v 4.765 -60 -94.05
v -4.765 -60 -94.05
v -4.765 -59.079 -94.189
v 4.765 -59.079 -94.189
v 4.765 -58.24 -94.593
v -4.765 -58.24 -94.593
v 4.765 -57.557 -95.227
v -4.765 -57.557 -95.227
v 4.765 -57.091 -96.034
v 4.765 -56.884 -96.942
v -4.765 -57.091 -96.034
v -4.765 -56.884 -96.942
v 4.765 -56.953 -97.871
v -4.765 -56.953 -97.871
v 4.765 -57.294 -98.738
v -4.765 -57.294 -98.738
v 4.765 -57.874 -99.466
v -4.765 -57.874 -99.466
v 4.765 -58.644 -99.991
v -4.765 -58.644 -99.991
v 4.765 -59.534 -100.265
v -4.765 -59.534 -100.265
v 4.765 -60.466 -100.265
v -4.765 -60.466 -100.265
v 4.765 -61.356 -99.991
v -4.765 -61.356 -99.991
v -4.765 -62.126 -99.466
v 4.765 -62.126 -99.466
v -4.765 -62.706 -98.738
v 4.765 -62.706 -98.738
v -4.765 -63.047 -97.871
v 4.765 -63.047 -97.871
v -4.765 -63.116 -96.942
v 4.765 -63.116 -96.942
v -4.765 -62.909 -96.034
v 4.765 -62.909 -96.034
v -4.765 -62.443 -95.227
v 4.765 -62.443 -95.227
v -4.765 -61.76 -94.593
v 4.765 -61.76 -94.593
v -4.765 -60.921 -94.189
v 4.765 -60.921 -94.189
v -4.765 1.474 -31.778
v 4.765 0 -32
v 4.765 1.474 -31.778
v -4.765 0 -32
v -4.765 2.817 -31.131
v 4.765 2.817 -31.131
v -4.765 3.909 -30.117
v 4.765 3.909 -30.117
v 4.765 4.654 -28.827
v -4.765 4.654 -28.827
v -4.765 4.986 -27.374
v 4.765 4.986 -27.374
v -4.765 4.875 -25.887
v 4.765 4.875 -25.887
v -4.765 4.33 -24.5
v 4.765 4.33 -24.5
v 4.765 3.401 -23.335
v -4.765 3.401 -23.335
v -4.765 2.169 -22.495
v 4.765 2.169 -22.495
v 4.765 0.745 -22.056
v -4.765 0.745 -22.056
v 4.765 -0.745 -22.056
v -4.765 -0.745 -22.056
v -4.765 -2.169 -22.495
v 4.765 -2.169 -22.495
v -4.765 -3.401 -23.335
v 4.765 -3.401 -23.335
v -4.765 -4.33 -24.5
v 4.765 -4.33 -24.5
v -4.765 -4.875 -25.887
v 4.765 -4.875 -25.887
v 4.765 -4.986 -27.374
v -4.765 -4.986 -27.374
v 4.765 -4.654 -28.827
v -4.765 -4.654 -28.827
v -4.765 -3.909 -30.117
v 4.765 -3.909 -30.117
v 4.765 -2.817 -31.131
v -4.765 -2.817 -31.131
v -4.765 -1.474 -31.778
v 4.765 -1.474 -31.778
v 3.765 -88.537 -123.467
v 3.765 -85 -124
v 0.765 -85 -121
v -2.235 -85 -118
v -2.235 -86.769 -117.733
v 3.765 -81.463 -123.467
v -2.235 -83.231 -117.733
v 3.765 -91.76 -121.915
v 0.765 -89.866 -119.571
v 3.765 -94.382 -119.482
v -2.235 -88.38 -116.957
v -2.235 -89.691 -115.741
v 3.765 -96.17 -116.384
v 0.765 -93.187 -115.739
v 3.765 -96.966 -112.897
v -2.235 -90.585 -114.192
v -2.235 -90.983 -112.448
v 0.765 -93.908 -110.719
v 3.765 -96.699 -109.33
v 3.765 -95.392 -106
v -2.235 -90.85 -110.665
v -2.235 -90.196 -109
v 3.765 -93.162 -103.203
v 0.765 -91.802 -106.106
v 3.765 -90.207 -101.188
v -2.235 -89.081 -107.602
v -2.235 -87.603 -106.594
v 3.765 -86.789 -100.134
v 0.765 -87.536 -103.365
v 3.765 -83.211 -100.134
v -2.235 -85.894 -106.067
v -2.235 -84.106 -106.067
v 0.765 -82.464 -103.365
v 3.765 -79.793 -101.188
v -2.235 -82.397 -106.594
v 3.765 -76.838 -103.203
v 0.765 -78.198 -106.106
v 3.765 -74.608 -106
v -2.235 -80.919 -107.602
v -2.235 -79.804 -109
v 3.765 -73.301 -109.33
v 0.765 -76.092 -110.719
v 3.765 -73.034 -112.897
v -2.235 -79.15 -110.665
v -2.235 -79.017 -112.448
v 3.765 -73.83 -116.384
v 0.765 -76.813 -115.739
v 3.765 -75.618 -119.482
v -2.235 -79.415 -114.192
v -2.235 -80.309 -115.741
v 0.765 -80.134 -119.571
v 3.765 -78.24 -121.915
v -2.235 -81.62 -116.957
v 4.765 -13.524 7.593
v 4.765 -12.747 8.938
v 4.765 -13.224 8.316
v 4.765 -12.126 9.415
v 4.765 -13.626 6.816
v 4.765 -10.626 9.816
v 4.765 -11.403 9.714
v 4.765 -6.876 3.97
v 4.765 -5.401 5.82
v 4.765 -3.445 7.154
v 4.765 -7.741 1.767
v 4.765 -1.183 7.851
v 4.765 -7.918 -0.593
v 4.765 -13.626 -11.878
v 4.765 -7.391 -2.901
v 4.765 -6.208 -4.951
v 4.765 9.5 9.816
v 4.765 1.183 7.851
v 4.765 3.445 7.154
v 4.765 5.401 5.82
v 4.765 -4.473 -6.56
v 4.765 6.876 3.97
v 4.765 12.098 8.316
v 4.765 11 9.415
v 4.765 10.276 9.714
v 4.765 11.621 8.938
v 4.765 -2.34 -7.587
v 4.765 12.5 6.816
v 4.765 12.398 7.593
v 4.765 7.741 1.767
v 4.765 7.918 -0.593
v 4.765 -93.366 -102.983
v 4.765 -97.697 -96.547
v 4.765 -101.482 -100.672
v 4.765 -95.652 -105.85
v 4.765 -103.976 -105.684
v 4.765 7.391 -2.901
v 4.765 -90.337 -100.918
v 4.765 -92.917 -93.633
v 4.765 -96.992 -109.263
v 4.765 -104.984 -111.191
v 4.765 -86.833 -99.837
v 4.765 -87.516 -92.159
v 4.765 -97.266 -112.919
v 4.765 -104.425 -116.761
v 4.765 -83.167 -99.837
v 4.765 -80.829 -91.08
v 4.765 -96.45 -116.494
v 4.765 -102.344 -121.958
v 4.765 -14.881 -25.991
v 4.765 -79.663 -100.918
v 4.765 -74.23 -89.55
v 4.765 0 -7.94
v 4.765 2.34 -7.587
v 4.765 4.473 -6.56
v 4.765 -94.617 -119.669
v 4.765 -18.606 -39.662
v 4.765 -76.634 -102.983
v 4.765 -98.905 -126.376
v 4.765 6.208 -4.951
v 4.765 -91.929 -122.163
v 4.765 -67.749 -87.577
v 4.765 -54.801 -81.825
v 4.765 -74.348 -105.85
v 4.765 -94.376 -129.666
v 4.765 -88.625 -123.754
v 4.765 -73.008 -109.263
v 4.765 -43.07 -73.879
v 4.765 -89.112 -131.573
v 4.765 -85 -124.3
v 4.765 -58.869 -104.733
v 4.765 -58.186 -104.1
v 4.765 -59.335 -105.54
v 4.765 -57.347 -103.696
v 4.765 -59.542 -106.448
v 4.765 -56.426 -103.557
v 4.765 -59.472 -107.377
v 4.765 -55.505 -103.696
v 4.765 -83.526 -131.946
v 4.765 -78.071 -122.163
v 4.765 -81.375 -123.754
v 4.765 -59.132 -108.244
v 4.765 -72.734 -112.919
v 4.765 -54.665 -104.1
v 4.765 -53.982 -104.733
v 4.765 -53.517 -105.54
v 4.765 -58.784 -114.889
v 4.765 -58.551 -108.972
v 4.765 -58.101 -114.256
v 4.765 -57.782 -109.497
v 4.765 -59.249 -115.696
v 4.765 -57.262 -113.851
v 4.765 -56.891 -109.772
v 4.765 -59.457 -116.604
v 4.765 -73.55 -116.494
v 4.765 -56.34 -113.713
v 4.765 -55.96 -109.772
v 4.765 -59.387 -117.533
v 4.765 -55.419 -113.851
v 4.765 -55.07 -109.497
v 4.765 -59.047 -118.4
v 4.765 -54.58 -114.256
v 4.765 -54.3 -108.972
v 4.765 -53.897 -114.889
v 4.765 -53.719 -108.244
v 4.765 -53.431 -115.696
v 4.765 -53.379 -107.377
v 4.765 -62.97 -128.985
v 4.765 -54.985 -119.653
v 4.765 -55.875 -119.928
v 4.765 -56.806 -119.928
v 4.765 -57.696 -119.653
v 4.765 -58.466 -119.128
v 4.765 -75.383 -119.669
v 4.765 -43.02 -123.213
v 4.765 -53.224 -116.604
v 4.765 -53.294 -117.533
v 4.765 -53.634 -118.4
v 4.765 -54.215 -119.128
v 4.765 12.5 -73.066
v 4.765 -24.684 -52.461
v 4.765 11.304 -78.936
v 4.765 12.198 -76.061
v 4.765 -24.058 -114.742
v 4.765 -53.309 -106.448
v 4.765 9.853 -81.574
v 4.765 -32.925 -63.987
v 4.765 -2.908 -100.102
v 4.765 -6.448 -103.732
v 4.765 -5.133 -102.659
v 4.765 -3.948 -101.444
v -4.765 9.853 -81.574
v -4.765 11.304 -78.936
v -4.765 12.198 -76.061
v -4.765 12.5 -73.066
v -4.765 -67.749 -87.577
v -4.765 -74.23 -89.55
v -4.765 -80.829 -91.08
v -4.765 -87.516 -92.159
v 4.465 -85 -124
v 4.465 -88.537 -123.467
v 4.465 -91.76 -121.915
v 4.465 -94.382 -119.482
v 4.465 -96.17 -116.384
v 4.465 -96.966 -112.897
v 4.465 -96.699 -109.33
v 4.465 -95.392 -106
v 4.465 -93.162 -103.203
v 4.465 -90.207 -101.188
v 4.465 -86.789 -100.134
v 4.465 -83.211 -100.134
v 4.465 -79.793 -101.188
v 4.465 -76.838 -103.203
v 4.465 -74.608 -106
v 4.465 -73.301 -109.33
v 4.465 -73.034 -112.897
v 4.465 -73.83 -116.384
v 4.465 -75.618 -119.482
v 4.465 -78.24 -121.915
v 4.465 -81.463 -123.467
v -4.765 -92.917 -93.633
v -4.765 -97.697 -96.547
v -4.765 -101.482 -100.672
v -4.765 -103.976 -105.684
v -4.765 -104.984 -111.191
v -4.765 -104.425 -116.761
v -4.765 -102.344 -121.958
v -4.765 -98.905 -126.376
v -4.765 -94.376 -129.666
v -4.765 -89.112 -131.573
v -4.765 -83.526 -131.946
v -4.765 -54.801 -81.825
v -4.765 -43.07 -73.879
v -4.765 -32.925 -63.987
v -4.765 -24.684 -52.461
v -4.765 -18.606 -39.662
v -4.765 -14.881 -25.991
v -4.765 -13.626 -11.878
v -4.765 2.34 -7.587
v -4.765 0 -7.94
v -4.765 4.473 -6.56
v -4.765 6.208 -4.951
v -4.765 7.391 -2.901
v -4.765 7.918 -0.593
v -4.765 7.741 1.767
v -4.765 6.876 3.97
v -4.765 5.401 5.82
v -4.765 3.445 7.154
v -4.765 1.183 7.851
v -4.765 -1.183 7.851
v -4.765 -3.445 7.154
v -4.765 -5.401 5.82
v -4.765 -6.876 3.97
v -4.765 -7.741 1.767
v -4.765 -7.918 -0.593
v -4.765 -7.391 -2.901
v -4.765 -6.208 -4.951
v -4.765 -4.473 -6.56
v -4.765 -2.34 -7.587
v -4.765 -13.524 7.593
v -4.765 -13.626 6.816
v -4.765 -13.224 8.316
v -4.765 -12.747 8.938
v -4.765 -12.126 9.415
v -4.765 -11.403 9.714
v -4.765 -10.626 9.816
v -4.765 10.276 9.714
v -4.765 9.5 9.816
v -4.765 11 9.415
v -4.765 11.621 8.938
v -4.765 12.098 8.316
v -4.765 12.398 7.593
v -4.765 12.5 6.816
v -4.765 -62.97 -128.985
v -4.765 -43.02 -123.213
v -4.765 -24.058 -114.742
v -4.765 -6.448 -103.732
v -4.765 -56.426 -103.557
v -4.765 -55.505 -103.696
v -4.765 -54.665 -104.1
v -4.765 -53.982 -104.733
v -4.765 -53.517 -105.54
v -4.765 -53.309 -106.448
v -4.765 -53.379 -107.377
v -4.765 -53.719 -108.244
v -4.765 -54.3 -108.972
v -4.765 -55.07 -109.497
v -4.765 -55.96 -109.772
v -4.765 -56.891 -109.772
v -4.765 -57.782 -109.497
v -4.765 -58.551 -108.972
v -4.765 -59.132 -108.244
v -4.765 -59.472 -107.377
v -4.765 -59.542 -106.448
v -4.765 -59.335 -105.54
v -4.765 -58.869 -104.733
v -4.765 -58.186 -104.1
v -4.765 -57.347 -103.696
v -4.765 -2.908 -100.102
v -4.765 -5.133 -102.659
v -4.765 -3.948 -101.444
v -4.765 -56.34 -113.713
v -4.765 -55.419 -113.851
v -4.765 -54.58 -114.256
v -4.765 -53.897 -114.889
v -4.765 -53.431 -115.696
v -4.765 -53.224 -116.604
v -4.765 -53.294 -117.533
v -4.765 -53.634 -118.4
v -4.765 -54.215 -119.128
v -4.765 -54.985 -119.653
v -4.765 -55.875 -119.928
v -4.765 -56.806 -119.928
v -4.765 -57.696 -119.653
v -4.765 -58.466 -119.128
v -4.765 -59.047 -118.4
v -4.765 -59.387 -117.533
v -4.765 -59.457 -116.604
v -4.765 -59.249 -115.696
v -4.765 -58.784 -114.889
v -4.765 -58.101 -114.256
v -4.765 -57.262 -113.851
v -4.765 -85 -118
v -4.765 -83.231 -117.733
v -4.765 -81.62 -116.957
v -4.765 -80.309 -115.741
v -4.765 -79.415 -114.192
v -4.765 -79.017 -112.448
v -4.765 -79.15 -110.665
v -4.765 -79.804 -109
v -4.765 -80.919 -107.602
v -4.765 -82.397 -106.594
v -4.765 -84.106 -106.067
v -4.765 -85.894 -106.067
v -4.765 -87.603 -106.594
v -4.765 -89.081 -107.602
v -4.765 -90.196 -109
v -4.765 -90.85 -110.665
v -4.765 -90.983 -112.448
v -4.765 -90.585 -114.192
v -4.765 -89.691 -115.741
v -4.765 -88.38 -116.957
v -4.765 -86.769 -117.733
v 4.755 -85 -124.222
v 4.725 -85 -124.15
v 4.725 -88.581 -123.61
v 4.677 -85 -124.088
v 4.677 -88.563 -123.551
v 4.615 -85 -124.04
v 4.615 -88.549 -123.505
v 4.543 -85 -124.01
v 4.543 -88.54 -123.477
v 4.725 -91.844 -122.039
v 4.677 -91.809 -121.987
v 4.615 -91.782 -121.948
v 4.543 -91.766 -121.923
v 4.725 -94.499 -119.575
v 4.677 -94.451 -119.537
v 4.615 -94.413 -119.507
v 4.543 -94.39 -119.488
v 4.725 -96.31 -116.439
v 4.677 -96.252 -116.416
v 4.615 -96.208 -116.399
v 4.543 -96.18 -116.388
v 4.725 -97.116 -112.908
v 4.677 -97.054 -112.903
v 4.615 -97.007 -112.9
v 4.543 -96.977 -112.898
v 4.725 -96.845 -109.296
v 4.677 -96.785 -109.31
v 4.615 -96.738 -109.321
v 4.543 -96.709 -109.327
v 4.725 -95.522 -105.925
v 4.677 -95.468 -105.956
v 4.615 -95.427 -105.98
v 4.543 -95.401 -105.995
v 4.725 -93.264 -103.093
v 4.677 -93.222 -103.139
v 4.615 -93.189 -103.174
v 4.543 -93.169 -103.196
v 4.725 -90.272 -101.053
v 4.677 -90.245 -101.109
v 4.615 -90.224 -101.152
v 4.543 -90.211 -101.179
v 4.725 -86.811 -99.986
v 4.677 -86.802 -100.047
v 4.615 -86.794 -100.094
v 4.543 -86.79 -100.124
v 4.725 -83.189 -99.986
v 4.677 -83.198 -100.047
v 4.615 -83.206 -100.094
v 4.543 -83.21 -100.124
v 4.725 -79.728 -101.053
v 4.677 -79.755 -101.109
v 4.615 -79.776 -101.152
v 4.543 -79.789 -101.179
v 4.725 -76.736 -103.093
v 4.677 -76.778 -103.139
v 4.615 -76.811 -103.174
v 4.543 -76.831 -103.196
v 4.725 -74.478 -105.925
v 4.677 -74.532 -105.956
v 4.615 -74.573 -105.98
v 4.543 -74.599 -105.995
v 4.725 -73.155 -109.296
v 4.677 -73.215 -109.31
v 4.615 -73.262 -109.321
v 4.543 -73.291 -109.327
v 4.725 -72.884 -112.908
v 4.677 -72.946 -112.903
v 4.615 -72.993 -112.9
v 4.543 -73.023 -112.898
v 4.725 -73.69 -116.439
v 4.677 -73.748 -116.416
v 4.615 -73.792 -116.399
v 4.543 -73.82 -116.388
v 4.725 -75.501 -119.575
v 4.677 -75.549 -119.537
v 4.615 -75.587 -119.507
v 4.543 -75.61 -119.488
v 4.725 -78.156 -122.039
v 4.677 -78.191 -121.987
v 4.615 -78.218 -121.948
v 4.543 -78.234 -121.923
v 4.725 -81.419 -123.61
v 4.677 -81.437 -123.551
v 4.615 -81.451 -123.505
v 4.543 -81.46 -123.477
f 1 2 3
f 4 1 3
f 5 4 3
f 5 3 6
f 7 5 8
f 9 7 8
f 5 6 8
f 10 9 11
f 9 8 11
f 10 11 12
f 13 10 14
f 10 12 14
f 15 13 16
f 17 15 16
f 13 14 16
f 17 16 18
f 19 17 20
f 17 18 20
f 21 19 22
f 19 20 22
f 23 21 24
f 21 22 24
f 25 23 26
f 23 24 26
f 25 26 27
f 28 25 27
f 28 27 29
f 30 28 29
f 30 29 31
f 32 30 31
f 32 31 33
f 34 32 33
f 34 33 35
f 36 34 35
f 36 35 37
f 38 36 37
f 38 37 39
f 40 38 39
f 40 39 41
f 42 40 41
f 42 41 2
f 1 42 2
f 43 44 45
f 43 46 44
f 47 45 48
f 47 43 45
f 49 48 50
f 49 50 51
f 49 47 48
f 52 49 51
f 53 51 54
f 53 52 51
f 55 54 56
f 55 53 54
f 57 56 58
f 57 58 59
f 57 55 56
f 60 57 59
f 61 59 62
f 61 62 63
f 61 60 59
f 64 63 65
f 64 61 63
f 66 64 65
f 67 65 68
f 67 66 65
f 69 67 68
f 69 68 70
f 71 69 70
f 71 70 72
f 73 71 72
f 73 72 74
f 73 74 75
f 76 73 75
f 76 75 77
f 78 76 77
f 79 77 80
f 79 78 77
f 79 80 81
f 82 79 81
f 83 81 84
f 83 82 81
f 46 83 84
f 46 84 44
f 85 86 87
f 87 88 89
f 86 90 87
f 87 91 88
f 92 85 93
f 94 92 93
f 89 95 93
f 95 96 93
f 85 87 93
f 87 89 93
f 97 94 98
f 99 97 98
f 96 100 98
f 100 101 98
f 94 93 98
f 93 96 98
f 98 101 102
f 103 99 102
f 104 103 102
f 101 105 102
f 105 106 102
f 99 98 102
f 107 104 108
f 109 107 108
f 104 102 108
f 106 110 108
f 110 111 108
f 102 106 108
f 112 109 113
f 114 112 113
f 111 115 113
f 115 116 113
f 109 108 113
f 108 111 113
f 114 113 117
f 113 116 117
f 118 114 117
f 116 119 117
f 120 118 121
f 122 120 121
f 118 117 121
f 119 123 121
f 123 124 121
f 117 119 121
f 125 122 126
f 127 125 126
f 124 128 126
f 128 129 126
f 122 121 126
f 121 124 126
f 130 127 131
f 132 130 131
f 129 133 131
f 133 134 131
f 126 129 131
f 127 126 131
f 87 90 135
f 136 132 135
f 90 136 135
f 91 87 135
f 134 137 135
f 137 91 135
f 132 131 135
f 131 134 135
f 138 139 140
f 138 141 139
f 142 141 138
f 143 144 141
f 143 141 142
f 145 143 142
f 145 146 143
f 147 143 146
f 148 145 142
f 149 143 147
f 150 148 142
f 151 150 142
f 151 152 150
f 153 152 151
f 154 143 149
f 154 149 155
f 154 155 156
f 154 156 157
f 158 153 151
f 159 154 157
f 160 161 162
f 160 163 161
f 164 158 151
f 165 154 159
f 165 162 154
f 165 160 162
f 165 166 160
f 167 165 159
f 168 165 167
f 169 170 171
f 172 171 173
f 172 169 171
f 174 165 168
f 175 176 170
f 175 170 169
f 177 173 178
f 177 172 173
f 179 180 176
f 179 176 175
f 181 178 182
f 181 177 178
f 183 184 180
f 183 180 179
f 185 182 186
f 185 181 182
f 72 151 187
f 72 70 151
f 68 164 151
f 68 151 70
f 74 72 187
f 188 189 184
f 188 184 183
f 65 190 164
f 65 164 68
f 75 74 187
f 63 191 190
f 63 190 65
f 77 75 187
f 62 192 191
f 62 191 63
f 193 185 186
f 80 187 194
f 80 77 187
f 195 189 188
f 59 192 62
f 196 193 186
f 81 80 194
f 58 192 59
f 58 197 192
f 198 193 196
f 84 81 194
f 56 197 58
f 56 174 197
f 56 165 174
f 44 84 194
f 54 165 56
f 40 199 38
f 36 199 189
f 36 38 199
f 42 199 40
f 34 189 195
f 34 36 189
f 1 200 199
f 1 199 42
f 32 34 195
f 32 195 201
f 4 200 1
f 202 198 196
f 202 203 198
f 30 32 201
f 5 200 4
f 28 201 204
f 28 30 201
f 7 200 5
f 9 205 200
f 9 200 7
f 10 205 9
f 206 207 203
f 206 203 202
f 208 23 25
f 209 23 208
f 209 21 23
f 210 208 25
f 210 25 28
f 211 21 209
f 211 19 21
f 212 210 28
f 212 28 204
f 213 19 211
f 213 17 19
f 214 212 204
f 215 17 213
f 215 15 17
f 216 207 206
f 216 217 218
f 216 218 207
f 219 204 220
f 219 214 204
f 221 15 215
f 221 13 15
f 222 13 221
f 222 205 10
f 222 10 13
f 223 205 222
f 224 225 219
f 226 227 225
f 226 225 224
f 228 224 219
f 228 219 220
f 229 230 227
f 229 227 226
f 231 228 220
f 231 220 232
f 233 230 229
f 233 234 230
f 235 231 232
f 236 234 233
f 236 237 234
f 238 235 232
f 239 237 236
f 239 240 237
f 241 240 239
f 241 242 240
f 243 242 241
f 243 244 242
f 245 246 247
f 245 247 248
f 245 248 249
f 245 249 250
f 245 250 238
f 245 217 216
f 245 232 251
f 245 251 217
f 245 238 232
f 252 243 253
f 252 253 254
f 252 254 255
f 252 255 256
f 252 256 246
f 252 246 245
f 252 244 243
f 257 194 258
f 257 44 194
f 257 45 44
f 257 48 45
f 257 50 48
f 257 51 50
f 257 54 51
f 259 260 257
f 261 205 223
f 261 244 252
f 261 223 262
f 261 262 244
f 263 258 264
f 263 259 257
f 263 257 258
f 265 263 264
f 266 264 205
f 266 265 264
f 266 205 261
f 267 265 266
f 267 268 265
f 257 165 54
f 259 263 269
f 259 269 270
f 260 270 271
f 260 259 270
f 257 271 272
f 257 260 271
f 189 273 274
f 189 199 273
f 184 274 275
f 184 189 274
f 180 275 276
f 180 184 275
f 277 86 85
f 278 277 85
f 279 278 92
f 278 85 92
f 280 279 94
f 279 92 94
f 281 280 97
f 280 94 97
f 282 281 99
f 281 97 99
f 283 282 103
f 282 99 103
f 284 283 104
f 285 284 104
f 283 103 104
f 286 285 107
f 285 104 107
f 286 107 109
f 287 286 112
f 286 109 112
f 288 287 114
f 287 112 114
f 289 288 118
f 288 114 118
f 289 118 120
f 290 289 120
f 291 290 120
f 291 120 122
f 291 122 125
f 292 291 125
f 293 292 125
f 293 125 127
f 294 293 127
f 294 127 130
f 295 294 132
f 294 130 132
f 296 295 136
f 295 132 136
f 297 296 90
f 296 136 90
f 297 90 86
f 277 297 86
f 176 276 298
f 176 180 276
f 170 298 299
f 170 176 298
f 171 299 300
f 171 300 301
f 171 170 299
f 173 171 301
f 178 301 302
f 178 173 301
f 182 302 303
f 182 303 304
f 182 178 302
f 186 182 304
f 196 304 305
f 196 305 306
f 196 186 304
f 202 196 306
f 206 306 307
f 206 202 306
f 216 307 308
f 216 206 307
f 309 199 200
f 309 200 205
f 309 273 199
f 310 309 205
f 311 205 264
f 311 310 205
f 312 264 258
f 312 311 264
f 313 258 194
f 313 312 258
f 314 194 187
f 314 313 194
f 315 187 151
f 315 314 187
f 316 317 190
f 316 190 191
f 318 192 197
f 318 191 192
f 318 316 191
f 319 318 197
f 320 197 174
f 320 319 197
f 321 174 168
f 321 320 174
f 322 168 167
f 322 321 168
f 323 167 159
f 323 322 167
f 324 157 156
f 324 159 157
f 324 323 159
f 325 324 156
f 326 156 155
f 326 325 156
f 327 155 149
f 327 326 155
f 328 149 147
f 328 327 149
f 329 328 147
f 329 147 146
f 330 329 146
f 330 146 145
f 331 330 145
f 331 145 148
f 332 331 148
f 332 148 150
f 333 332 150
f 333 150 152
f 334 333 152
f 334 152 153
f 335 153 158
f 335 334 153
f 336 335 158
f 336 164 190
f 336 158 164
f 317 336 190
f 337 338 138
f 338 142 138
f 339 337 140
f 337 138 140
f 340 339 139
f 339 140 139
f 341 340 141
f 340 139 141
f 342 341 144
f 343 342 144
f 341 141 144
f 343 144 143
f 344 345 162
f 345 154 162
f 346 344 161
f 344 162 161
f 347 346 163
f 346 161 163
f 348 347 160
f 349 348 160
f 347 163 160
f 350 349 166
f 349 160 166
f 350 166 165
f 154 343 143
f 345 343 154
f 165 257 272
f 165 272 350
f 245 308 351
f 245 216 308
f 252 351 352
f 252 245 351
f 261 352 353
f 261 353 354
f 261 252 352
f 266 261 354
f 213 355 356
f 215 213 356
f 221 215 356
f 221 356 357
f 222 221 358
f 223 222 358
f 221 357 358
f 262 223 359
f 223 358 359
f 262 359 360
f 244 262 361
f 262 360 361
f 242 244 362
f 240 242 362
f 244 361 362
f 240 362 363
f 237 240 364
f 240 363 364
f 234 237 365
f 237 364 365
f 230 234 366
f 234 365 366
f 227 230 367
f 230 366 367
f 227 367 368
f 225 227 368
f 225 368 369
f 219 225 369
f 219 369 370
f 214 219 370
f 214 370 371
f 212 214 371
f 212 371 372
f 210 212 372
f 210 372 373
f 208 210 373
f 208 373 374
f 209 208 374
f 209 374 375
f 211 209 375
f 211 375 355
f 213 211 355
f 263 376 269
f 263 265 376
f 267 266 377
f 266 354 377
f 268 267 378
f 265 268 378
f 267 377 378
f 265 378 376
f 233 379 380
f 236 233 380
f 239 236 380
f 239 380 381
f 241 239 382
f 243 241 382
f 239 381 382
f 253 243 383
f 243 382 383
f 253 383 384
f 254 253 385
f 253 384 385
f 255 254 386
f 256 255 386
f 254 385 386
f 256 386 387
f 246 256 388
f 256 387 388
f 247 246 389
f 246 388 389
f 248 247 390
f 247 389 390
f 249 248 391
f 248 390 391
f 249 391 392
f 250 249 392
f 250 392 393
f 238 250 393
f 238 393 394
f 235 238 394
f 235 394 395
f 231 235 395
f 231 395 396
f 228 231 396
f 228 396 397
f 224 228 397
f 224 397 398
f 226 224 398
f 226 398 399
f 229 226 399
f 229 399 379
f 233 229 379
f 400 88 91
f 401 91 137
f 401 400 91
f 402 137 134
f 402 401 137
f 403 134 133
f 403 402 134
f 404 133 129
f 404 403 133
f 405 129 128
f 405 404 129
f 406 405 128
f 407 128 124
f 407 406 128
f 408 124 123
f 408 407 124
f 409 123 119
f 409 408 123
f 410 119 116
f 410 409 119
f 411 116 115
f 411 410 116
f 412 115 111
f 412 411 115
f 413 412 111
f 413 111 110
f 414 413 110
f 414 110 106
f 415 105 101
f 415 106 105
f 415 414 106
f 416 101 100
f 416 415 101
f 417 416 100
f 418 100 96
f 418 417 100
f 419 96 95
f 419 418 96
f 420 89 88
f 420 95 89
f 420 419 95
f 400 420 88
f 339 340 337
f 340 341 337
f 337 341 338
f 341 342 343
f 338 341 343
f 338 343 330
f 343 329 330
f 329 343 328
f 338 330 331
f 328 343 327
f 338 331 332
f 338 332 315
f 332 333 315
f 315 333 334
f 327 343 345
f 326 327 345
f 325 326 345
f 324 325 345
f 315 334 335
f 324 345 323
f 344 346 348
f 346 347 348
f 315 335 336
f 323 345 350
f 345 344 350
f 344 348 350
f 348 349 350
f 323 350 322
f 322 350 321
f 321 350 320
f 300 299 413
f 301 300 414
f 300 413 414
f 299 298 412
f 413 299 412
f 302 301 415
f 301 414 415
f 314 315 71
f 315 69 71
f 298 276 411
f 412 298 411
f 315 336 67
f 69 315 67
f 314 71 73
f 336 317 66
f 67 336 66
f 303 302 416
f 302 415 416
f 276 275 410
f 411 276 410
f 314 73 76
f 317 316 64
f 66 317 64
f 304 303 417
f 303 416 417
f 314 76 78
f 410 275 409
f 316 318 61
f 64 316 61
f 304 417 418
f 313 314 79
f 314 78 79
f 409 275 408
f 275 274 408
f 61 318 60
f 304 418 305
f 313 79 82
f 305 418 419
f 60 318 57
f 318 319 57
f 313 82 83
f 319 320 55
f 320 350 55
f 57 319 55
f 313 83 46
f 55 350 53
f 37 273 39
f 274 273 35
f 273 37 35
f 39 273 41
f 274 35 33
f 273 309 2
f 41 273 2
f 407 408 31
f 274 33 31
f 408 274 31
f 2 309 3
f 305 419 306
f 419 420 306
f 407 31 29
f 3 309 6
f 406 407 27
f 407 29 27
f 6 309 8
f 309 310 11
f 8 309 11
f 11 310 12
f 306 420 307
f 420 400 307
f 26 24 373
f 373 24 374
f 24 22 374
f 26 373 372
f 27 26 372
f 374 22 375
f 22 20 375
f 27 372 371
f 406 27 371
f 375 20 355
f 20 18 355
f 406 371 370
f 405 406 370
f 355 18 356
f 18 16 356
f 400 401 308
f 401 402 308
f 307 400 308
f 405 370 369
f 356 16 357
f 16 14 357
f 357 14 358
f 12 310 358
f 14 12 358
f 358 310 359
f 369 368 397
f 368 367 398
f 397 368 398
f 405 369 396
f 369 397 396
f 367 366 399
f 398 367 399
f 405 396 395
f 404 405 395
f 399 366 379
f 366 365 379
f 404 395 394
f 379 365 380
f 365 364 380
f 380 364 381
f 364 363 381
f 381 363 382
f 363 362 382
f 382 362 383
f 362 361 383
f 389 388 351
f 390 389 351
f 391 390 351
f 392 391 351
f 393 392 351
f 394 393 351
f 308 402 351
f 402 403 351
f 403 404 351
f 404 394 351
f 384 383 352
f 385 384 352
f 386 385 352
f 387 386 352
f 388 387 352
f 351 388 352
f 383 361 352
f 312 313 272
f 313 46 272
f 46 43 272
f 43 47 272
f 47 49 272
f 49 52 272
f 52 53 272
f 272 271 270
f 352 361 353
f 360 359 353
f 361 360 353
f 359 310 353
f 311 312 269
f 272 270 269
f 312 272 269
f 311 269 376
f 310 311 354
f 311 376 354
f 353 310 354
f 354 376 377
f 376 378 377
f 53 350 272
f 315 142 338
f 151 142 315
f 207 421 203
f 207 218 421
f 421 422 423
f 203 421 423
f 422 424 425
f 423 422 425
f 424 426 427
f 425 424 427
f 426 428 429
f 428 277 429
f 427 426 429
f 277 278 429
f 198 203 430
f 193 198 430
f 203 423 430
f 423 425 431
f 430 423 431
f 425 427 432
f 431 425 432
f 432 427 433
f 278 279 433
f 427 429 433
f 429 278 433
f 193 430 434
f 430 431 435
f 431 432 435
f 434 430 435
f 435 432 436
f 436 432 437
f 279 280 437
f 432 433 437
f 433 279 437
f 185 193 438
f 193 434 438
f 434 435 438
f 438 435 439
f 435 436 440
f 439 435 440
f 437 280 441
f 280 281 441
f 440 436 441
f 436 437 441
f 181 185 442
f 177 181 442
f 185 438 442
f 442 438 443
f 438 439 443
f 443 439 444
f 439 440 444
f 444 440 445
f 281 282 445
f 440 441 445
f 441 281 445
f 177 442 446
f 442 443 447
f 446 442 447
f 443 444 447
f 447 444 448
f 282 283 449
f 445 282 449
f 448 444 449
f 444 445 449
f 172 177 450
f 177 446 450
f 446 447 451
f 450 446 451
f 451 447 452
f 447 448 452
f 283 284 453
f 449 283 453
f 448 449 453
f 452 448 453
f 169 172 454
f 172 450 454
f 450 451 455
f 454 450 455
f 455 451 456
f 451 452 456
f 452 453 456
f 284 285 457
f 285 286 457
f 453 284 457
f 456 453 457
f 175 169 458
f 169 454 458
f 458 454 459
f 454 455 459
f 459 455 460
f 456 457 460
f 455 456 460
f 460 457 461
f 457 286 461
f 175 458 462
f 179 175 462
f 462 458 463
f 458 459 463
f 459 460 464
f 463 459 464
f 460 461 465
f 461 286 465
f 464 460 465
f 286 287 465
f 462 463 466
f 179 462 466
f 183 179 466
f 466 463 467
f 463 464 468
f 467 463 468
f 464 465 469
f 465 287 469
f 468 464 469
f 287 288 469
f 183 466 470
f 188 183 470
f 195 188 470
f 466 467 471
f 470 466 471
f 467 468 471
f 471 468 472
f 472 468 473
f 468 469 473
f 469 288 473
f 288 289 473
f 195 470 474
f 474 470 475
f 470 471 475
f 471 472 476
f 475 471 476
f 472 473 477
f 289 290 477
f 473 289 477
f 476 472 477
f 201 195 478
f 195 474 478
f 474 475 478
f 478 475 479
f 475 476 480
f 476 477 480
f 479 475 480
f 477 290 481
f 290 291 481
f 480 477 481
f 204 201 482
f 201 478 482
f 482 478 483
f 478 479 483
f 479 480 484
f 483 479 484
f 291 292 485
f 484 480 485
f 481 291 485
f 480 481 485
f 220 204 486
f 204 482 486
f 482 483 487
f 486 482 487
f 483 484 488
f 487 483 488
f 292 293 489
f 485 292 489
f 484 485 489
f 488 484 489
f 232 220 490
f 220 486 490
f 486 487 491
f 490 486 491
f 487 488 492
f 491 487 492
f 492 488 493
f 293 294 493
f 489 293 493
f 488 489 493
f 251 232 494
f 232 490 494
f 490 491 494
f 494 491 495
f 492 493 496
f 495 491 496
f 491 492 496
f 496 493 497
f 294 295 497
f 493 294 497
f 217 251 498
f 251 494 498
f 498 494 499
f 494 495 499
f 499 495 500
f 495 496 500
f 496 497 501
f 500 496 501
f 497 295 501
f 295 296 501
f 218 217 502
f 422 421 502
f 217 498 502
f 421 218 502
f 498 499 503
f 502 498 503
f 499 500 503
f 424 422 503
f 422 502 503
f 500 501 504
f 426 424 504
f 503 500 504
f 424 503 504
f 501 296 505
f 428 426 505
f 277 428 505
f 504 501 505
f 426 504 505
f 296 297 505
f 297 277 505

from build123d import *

# Parameters (mm, degrees)
CROQUIS13_R                = 5
CROQUIS13_R_2              = 6
SALIENTE_EXTRUIR1_DEPTH    = 4.765
REDONDEO2_R                = 0.3
REDONDEO3_R                = 80
REDONDEO4_R                = 15
CORTAR_EXTRUIR2_REACH      = 170.937
CROQUIS18_R                = 3.125
CORTAR_EXTRUIR3_DEPTH      = 169.735607463
CORTAR_EXTRUIR3_DEPTH_BACK = 169.735607463
REDONDEO5_R                = 3
CORTAR_EXTRUIR4_DEPTH      = 169.735607463
CORTAR_EXTRUIR4_DEPTH_BACK = 169.735607463
CROQUIS21_R                = 7.94


with BuildPart() as part:
    # Croquis13 → Saliente-Extruir1 (new, symmetric)
    with BuildSketch(Plane(origin=(0, 0, 0), x_dir=(0, 0, -1), z_dir=(1, 0, 0))):
        with BuildLine():
            Line((102.163414857, -4.327209349), (81.574356475, 9.853435029))
            ThreePointArc((81.574356475, 9.853435029), (77.521218134, 11.823084958), (73.065969849, 12.5))
            Line((73.065969849, 12.5), (-16.81645687, 12.5))
            ThreePointArc((-16.81645687, 12.5), (-20.351990776, 11.035533906), (-21.81645687, 7.5))
            Line((-21.81645687, 7.5), (-21.81645687, -8.626101457))
            ThreePointArc((-21.81645687, -8.626101457), (-20.351990776, -12.161635363), (-16.81645687, -13.626101457))
            Line((-16.81645687, -13.626101457), (43.18354313, -13.626101457))
            ThreePointArc((43.18354313, -13.626101457), (76.306099966, -44.847644025), (92.158871945, -87.515877082))
            ThreePointArc((92.158871945, -87.515877082), (113.995550437, -104.900195438), (131.945619804, -83.526144302))
            ThreePointArc((131.945619804, -83.526144302), (122.754645176, -41.783183661), (102.163414857, -4.327209349))
        make_face()
        with Locations((27, 0)):
            Circle(CROQUIS13_R, mode=Mode.SUBTRACT)
        Circle(CROQUIS13_R, mode=Mode.SUBTRACT)
        with Locations((112, -85)):
            Circle(CROQUIS13_R_2, mode=Mode.SUBTRACT)
    extrude(amount=SALIENTE_EXTRUIR1_DEPTH, both=True)

    # Croquis15 → Cortar-Revolución2 (revolve, cut)
    with BuildSketch(Plane(origin=(0, -85, 0), x_dir=(1, 0, 0), z_dir=(0, 1, 0)), mode=Mode.PRIVATE) as cortar_revoluci_n2_sk:
        Polygon((4.765, 106.01), (4.765, 100), (3.765, 100), (-2.245, 106.01), align=None)
    revolve(cortar_revoluci_n2_sk.sketch.rotate(Axis((4.765, -85, -112), (-1, 0, 0)), 180), axis=Axis((4.765, -85, -112), (-1, 0, 0)), mode=Mode.SUBTRACT)

    # Redondeo2
    redondeo2_edges = [part.edges().sort_by_distance(p)[0] for p in [
        (4.765, -85, -100),
    ]]
    fillet(redondeo2_edges, radius=REDONDEO2_R)

    # Redondeo3
    redondeo3_edges = [part.edges().sort_by_distance(p)[0] for p in [
        (0, -13.626101457, -43.18354313),
    ]]
    fillet(redondeo3_edges, radius=REDONDEO3_R)

    # Redondeo4
    redondeo4_edges = [part.edges().sort_by_distance(p)[0] for p in [
        (0, -4.327209349, -102.163414857),
    ]]
    fillet(redondeo4_edges, radius=REDONDEO4_R)

    # Croquis18 → Cortar-Extruir2 (cut, up to next)
    with BuildSketch(Plane.ZY.offset(4.765), mode=Mode.PRIVATE) as cortar_extruir2_sk1:
        with Locations((-97.175215853, -60)):
            Circle(CROQUIS18_R)
    cortar_extruir2_tool1 = extrude(cortar_extruir2_sk1.sketch, amount=-CORTAR_EXTRUIR2_REACH, mode=Mode.PRIVATE) & part.part
    # Croquis18 → Cortar-Extruir2 (cut, up to next)
    with BuildSketch(Plane.ZY.offset(4.765), mode=Mode.PRIVATE) as cortar_extruir2_sk2:
        with Locations((-116.837549653, -56.340405824)):
            Circle(CROQUIS18_R)
    cortar_extruir2_tool2 = extrude(cortar_extruir2_sk2.sketch, amount=-CORTAR_EXTRUIR2_REACH, mode=Mode.PRIVATE) & part.part
    # Croquis18 → Cortar-Extruir2 (cut, up to next)
    with BuildSketch(Plane.ZY.offset(4.765), mode=Mode.PRIVATE) as cortar_extruir2_sk3:
        with Locations((-106.681694763, -56.425713405)):
            Circle(CROQUIS18_R)
    cortar_extruir2_tool3 = extrude(cortar_extruir2_sk3.sketch, amount=-CORTAR_EXTRUIR2_REACH, mode=Mode.PRIVATE) & part.part
    add(cortar_extruir2_tool1.solids().sort_by_distance((-4.765, -60, -97.175216))[0], mode=Mode.SUBTRACT)
    add(cortar_extruir2_tool2.solids().sort_by_distance((-4.765, -56.340406, -116.83755))[0], mode=Mode.SUBTRACT)
    add(cortar_extruir2_tool3.solids().sort_by_distance((-4.765, -56.425713, -106.681695))[0], mode=Mode.SUBTRACT)

    # Croquis20 → Cortar-Extruir3 (cut, two sides: drawn at the far end of the back side and taken through both)
    with BuildSketch(Plane(origin=(0, 0, 0), x_dir=(0, 0, -1), z_dir=(1, 0, 0)).offset(-CORTAR_EXTRUIR3_DEPTH_BACK)):
        with BuildLine():
            Line((-21.81645687, 7.5), (-21.81645687, -8.626101457))
            ThreePointArc((-21.81645687, -8.626101457), (-20.351990776, -12.161635363), (-16.81645687, -13.626101457))
            Line((-16.81645687, -13.626101457), (-9.81645687, -13.626101457))
            Line((-9.81645687, -13.626101457), (-9.81645687, 12.5))
            Line((-9.81645687, 12.5), (-16.81645687, 12.5))
            ThreePointArc((-16.81645687, 12.5), (-20.351990776, 11.035533906), (-21.81645687, 7.5))
        make_face()
    extrude(amount=CORTAR_EXTRUIR3_DEPTH + CORTAR_EXTRUIR3_DEPTH_BACK, mode=Mode.SUBTRACT)

    # Redondeo5
    redondeo5_edges = [part.edges().sort_by_distance(p)[0] for p in [
        (0, 12.5, 9.81645687),
        (0, -13.626101457, 9.81645687),
    ]]
    fillet(redondeo5_edges, radius=REDONDEO5_R)

    # Croquis21 → Cortar-Extruir4 (cut, two sides: drawn at the far end of the back side and taken through both)
    with BuildSketch(Plane(origin=(0, 0, 0), x_dir=(0, 0, -1), z_dir=(1, 0, 0)).offset(-CORTAR_EXTRUIR4_DEPTH_BACK)):
        Circle(CROQUIS21_R)
    extrude(amount=CORTAR_EXTRUIR4_DEPTH + CORTAR_EXTRUIR4_DEPTH_BACK, mode=Mode.SUBTRACT)


solid = part.part
